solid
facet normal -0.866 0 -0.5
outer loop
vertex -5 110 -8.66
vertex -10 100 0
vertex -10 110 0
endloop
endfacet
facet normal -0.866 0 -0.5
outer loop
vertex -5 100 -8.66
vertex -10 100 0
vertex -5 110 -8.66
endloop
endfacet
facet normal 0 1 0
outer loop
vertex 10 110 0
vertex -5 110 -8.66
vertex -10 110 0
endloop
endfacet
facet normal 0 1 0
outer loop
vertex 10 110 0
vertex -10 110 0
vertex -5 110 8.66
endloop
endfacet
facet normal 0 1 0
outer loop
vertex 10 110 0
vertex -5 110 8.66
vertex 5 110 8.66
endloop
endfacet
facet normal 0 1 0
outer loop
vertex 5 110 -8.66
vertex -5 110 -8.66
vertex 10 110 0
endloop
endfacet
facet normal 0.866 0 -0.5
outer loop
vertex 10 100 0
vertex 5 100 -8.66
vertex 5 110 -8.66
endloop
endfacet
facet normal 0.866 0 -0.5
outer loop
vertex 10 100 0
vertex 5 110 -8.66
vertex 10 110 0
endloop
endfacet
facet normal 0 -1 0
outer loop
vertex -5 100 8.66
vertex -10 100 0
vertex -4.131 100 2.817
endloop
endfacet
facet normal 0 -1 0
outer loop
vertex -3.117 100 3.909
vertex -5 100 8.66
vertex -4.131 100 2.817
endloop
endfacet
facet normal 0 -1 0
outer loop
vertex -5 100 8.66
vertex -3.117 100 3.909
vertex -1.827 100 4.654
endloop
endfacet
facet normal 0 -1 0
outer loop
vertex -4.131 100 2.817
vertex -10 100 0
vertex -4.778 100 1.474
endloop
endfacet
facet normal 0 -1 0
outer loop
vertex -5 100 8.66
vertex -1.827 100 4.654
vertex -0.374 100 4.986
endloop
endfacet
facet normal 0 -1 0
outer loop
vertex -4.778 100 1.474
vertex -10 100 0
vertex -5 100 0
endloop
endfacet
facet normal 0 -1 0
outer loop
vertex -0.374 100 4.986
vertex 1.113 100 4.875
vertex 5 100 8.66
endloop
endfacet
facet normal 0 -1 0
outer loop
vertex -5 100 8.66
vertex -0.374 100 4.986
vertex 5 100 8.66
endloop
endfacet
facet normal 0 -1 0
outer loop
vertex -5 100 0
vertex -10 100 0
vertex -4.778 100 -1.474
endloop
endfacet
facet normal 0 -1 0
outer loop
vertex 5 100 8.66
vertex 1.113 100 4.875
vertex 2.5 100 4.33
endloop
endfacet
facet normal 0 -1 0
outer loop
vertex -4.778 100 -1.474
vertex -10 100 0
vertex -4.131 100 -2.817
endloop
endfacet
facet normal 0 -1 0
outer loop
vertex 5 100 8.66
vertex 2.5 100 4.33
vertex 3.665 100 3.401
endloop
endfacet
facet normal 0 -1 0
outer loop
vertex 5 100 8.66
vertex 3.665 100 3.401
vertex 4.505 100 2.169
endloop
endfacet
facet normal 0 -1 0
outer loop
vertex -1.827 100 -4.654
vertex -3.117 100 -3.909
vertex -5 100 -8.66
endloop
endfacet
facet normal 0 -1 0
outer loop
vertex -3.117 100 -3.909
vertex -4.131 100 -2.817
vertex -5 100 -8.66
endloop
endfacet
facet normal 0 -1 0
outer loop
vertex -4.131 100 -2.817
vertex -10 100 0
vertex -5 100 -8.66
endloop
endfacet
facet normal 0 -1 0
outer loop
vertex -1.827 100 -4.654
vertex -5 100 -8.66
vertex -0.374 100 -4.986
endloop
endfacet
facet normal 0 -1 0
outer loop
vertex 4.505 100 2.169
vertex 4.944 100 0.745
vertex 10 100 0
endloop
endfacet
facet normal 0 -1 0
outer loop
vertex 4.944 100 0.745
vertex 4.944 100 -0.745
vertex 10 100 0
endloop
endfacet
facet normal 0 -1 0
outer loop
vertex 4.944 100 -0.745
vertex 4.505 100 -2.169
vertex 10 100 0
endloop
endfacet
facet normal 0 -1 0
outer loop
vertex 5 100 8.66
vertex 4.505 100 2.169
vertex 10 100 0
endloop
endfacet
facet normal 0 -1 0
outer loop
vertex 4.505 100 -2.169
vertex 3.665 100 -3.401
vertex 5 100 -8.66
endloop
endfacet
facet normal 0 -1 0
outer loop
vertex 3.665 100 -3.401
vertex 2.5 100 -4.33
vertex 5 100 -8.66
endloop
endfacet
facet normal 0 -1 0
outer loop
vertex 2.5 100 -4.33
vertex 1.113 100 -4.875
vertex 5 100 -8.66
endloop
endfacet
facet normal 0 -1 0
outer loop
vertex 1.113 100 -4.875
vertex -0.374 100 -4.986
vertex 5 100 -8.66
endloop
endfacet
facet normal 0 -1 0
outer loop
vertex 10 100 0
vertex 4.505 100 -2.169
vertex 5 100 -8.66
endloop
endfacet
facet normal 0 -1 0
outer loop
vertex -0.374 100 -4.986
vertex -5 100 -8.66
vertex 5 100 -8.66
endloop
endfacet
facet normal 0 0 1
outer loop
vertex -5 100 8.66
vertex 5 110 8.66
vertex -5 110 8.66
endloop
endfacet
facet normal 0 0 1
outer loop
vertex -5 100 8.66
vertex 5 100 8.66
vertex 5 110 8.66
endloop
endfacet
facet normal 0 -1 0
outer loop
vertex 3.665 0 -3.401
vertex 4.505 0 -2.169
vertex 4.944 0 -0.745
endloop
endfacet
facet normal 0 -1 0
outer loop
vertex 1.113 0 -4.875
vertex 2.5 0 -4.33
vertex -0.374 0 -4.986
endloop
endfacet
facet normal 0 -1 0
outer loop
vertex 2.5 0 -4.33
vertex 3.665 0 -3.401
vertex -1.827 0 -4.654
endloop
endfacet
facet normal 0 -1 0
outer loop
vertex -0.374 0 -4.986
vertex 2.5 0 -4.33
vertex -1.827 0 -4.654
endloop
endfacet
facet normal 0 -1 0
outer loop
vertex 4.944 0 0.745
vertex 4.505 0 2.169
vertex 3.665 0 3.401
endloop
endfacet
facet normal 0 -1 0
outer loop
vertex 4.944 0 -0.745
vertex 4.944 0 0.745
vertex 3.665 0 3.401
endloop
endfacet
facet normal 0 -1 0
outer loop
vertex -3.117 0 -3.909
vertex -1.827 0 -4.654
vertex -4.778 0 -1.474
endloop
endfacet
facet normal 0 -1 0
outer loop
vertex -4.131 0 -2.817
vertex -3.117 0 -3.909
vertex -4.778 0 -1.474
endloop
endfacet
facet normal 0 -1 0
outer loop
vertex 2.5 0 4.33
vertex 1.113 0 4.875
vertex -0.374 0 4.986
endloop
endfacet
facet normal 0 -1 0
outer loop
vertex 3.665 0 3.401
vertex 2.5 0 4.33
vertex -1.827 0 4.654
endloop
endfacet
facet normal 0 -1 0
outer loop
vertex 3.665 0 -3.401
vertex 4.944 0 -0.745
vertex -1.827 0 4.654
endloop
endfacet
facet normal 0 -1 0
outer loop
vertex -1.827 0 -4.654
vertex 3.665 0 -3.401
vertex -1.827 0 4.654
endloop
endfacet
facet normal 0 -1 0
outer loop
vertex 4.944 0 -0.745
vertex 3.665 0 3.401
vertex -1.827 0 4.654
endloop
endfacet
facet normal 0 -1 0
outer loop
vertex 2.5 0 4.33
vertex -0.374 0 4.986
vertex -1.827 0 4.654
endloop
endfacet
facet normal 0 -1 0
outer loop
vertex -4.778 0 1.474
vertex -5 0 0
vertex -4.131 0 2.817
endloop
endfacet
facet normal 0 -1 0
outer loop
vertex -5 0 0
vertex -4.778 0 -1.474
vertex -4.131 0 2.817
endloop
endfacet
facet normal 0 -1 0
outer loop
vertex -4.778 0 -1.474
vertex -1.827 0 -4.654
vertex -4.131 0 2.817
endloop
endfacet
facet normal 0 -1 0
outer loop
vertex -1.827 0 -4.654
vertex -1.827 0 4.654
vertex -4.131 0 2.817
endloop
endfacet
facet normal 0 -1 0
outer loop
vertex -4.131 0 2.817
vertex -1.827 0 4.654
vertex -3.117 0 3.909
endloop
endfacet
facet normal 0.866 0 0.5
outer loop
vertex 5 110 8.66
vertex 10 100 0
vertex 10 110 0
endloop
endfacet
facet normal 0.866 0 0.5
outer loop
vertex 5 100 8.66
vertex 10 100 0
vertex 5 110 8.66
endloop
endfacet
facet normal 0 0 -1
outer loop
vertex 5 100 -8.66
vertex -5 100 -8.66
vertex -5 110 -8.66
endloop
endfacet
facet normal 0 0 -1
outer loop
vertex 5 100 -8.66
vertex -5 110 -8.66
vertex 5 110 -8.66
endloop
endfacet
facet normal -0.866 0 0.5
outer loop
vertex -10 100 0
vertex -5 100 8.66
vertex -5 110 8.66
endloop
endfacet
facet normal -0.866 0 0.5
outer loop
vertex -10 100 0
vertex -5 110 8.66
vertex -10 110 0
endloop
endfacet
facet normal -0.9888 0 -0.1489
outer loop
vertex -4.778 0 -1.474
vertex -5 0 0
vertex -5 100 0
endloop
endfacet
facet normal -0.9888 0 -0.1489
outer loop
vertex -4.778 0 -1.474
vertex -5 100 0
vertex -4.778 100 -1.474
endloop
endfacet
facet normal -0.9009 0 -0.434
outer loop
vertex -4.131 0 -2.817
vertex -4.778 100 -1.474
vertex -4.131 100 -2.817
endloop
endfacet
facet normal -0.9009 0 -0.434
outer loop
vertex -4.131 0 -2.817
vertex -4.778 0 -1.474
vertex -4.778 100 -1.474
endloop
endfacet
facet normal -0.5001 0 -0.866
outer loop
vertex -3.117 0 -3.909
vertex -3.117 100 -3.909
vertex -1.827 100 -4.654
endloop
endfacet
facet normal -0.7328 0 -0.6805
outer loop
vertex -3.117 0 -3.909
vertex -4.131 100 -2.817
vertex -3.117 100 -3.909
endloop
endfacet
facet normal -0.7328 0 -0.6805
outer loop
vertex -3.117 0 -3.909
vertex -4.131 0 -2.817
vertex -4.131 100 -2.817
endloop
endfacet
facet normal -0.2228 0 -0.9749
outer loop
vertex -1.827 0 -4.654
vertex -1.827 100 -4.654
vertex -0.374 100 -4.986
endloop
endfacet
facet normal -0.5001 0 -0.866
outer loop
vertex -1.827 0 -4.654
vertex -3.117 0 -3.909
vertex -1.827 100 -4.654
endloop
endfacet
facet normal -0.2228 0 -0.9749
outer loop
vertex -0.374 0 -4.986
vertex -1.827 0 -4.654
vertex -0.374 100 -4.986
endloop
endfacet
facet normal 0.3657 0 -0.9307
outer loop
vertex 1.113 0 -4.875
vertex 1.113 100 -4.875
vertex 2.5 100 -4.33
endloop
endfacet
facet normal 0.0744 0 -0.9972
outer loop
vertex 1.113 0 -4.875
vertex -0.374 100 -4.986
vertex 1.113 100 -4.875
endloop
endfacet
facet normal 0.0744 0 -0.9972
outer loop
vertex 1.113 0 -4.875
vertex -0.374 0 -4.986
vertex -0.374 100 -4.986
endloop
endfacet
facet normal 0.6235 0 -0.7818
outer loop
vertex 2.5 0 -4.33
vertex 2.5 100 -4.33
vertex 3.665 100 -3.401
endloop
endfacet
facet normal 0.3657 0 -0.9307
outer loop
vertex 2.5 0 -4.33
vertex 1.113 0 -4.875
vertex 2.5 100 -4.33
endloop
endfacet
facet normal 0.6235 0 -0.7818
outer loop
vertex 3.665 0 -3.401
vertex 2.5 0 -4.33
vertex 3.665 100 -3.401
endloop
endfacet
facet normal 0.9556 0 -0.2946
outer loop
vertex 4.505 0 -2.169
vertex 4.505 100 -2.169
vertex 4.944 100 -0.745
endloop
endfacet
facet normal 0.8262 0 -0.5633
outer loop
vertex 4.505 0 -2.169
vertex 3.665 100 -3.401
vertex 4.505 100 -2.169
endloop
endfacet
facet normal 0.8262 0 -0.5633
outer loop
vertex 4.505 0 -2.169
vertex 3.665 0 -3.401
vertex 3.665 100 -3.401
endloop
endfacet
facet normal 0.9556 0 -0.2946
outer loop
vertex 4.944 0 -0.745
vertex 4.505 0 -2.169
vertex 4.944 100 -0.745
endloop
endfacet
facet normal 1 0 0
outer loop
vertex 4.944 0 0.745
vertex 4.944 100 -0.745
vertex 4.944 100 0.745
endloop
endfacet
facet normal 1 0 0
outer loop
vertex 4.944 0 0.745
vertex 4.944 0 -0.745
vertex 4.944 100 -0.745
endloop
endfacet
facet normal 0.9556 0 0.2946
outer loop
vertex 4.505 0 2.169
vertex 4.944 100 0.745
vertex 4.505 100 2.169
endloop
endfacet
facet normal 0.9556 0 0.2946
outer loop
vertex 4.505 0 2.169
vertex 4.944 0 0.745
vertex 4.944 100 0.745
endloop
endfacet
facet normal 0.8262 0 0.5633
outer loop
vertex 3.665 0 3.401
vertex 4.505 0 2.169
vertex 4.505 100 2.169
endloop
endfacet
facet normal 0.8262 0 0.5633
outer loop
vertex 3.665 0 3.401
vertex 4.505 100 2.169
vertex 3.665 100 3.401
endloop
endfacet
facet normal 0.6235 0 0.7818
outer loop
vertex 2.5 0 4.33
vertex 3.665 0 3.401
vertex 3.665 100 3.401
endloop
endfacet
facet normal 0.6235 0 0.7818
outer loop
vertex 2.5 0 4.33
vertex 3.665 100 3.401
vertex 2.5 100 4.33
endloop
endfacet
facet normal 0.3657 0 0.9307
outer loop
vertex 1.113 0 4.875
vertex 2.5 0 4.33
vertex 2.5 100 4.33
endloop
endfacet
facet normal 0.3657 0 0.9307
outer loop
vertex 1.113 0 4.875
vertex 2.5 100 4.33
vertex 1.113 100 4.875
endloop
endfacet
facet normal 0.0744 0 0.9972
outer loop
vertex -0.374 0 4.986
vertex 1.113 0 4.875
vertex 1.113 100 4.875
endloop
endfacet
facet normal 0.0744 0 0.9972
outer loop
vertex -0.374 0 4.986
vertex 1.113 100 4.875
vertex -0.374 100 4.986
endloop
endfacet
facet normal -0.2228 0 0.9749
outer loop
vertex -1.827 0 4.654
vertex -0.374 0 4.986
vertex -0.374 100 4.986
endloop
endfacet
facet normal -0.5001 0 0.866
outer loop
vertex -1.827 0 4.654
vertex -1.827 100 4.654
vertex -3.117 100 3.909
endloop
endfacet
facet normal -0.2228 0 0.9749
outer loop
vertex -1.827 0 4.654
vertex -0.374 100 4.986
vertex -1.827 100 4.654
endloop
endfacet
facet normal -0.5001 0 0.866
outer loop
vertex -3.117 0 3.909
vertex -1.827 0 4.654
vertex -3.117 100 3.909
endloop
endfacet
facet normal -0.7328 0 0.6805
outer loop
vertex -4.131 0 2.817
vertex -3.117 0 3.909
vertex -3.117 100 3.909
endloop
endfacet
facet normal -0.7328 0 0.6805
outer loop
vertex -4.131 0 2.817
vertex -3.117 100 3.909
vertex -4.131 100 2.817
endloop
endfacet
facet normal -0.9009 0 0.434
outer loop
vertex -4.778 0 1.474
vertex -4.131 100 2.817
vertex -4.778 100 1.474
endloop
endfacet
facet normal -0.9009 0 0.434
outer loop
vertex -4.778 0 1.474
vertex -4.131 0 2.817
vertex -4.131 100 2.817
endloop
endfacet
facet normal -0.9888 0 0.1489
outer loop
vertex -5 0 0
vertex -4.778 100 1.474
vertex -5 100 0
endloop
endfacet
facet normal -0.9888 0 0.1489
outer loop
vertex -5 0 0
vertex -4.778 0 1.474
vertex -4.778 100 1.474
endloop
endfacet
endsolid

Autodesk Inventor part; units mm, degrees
ref_plane "YZ Plane" through (0, 0, 0) normal (1, 0, 0) x (0, 1, 0)
ref_plane "XZ Plane" through (0, 0, 0) normal (0, 1, 0) x (-1, 0, 0)
ref_plane "XY Plane" through (0, 0, 0) normal (0, 0, 1) x (1, 0, 0)
sketch "Sketch1" plane through (0, 0, 0) normal (0, 1, 0) x (-1, 0, 0)
  circle A0 centre (0, 0) radius 5
  dimension "d0" = 10
extrude "Extrusion1" add sketch "Sketch1" along normal blind 100
thread "Thread1" size "M10x1" class "6g" standard "ISO Metric profile" length 10
sketch "Sketch2" plane through (0, 100, 0) normal (0, 1, 0) x (1, 0, 0)
  circle A0 centre (0, 0) radius 5 projected
  circle A1 centre (0, 0) radius 10 construction
  line L0 (-10, 0) -> (-5, 8.6603)
  line L1 (-5, 8.6603) -> (5, 8.6603)
  line L2 (5, 8.6603) -> (10, 0)
  line L3 (10, 0) -> (5, -8.6603)
  line L4 (5, -8.6603) -> (-5, -8.6603)
  line L5 (-5, -8.6603) -> (-10, 0)
  dimension "d5" = 20
extrude "Extrusion2" add sketch "Sketch2" along normal blind 10 contours A0 | L0 L1 L2 L3 L4 L5
properties part number "BoltA" material "Titanium"
